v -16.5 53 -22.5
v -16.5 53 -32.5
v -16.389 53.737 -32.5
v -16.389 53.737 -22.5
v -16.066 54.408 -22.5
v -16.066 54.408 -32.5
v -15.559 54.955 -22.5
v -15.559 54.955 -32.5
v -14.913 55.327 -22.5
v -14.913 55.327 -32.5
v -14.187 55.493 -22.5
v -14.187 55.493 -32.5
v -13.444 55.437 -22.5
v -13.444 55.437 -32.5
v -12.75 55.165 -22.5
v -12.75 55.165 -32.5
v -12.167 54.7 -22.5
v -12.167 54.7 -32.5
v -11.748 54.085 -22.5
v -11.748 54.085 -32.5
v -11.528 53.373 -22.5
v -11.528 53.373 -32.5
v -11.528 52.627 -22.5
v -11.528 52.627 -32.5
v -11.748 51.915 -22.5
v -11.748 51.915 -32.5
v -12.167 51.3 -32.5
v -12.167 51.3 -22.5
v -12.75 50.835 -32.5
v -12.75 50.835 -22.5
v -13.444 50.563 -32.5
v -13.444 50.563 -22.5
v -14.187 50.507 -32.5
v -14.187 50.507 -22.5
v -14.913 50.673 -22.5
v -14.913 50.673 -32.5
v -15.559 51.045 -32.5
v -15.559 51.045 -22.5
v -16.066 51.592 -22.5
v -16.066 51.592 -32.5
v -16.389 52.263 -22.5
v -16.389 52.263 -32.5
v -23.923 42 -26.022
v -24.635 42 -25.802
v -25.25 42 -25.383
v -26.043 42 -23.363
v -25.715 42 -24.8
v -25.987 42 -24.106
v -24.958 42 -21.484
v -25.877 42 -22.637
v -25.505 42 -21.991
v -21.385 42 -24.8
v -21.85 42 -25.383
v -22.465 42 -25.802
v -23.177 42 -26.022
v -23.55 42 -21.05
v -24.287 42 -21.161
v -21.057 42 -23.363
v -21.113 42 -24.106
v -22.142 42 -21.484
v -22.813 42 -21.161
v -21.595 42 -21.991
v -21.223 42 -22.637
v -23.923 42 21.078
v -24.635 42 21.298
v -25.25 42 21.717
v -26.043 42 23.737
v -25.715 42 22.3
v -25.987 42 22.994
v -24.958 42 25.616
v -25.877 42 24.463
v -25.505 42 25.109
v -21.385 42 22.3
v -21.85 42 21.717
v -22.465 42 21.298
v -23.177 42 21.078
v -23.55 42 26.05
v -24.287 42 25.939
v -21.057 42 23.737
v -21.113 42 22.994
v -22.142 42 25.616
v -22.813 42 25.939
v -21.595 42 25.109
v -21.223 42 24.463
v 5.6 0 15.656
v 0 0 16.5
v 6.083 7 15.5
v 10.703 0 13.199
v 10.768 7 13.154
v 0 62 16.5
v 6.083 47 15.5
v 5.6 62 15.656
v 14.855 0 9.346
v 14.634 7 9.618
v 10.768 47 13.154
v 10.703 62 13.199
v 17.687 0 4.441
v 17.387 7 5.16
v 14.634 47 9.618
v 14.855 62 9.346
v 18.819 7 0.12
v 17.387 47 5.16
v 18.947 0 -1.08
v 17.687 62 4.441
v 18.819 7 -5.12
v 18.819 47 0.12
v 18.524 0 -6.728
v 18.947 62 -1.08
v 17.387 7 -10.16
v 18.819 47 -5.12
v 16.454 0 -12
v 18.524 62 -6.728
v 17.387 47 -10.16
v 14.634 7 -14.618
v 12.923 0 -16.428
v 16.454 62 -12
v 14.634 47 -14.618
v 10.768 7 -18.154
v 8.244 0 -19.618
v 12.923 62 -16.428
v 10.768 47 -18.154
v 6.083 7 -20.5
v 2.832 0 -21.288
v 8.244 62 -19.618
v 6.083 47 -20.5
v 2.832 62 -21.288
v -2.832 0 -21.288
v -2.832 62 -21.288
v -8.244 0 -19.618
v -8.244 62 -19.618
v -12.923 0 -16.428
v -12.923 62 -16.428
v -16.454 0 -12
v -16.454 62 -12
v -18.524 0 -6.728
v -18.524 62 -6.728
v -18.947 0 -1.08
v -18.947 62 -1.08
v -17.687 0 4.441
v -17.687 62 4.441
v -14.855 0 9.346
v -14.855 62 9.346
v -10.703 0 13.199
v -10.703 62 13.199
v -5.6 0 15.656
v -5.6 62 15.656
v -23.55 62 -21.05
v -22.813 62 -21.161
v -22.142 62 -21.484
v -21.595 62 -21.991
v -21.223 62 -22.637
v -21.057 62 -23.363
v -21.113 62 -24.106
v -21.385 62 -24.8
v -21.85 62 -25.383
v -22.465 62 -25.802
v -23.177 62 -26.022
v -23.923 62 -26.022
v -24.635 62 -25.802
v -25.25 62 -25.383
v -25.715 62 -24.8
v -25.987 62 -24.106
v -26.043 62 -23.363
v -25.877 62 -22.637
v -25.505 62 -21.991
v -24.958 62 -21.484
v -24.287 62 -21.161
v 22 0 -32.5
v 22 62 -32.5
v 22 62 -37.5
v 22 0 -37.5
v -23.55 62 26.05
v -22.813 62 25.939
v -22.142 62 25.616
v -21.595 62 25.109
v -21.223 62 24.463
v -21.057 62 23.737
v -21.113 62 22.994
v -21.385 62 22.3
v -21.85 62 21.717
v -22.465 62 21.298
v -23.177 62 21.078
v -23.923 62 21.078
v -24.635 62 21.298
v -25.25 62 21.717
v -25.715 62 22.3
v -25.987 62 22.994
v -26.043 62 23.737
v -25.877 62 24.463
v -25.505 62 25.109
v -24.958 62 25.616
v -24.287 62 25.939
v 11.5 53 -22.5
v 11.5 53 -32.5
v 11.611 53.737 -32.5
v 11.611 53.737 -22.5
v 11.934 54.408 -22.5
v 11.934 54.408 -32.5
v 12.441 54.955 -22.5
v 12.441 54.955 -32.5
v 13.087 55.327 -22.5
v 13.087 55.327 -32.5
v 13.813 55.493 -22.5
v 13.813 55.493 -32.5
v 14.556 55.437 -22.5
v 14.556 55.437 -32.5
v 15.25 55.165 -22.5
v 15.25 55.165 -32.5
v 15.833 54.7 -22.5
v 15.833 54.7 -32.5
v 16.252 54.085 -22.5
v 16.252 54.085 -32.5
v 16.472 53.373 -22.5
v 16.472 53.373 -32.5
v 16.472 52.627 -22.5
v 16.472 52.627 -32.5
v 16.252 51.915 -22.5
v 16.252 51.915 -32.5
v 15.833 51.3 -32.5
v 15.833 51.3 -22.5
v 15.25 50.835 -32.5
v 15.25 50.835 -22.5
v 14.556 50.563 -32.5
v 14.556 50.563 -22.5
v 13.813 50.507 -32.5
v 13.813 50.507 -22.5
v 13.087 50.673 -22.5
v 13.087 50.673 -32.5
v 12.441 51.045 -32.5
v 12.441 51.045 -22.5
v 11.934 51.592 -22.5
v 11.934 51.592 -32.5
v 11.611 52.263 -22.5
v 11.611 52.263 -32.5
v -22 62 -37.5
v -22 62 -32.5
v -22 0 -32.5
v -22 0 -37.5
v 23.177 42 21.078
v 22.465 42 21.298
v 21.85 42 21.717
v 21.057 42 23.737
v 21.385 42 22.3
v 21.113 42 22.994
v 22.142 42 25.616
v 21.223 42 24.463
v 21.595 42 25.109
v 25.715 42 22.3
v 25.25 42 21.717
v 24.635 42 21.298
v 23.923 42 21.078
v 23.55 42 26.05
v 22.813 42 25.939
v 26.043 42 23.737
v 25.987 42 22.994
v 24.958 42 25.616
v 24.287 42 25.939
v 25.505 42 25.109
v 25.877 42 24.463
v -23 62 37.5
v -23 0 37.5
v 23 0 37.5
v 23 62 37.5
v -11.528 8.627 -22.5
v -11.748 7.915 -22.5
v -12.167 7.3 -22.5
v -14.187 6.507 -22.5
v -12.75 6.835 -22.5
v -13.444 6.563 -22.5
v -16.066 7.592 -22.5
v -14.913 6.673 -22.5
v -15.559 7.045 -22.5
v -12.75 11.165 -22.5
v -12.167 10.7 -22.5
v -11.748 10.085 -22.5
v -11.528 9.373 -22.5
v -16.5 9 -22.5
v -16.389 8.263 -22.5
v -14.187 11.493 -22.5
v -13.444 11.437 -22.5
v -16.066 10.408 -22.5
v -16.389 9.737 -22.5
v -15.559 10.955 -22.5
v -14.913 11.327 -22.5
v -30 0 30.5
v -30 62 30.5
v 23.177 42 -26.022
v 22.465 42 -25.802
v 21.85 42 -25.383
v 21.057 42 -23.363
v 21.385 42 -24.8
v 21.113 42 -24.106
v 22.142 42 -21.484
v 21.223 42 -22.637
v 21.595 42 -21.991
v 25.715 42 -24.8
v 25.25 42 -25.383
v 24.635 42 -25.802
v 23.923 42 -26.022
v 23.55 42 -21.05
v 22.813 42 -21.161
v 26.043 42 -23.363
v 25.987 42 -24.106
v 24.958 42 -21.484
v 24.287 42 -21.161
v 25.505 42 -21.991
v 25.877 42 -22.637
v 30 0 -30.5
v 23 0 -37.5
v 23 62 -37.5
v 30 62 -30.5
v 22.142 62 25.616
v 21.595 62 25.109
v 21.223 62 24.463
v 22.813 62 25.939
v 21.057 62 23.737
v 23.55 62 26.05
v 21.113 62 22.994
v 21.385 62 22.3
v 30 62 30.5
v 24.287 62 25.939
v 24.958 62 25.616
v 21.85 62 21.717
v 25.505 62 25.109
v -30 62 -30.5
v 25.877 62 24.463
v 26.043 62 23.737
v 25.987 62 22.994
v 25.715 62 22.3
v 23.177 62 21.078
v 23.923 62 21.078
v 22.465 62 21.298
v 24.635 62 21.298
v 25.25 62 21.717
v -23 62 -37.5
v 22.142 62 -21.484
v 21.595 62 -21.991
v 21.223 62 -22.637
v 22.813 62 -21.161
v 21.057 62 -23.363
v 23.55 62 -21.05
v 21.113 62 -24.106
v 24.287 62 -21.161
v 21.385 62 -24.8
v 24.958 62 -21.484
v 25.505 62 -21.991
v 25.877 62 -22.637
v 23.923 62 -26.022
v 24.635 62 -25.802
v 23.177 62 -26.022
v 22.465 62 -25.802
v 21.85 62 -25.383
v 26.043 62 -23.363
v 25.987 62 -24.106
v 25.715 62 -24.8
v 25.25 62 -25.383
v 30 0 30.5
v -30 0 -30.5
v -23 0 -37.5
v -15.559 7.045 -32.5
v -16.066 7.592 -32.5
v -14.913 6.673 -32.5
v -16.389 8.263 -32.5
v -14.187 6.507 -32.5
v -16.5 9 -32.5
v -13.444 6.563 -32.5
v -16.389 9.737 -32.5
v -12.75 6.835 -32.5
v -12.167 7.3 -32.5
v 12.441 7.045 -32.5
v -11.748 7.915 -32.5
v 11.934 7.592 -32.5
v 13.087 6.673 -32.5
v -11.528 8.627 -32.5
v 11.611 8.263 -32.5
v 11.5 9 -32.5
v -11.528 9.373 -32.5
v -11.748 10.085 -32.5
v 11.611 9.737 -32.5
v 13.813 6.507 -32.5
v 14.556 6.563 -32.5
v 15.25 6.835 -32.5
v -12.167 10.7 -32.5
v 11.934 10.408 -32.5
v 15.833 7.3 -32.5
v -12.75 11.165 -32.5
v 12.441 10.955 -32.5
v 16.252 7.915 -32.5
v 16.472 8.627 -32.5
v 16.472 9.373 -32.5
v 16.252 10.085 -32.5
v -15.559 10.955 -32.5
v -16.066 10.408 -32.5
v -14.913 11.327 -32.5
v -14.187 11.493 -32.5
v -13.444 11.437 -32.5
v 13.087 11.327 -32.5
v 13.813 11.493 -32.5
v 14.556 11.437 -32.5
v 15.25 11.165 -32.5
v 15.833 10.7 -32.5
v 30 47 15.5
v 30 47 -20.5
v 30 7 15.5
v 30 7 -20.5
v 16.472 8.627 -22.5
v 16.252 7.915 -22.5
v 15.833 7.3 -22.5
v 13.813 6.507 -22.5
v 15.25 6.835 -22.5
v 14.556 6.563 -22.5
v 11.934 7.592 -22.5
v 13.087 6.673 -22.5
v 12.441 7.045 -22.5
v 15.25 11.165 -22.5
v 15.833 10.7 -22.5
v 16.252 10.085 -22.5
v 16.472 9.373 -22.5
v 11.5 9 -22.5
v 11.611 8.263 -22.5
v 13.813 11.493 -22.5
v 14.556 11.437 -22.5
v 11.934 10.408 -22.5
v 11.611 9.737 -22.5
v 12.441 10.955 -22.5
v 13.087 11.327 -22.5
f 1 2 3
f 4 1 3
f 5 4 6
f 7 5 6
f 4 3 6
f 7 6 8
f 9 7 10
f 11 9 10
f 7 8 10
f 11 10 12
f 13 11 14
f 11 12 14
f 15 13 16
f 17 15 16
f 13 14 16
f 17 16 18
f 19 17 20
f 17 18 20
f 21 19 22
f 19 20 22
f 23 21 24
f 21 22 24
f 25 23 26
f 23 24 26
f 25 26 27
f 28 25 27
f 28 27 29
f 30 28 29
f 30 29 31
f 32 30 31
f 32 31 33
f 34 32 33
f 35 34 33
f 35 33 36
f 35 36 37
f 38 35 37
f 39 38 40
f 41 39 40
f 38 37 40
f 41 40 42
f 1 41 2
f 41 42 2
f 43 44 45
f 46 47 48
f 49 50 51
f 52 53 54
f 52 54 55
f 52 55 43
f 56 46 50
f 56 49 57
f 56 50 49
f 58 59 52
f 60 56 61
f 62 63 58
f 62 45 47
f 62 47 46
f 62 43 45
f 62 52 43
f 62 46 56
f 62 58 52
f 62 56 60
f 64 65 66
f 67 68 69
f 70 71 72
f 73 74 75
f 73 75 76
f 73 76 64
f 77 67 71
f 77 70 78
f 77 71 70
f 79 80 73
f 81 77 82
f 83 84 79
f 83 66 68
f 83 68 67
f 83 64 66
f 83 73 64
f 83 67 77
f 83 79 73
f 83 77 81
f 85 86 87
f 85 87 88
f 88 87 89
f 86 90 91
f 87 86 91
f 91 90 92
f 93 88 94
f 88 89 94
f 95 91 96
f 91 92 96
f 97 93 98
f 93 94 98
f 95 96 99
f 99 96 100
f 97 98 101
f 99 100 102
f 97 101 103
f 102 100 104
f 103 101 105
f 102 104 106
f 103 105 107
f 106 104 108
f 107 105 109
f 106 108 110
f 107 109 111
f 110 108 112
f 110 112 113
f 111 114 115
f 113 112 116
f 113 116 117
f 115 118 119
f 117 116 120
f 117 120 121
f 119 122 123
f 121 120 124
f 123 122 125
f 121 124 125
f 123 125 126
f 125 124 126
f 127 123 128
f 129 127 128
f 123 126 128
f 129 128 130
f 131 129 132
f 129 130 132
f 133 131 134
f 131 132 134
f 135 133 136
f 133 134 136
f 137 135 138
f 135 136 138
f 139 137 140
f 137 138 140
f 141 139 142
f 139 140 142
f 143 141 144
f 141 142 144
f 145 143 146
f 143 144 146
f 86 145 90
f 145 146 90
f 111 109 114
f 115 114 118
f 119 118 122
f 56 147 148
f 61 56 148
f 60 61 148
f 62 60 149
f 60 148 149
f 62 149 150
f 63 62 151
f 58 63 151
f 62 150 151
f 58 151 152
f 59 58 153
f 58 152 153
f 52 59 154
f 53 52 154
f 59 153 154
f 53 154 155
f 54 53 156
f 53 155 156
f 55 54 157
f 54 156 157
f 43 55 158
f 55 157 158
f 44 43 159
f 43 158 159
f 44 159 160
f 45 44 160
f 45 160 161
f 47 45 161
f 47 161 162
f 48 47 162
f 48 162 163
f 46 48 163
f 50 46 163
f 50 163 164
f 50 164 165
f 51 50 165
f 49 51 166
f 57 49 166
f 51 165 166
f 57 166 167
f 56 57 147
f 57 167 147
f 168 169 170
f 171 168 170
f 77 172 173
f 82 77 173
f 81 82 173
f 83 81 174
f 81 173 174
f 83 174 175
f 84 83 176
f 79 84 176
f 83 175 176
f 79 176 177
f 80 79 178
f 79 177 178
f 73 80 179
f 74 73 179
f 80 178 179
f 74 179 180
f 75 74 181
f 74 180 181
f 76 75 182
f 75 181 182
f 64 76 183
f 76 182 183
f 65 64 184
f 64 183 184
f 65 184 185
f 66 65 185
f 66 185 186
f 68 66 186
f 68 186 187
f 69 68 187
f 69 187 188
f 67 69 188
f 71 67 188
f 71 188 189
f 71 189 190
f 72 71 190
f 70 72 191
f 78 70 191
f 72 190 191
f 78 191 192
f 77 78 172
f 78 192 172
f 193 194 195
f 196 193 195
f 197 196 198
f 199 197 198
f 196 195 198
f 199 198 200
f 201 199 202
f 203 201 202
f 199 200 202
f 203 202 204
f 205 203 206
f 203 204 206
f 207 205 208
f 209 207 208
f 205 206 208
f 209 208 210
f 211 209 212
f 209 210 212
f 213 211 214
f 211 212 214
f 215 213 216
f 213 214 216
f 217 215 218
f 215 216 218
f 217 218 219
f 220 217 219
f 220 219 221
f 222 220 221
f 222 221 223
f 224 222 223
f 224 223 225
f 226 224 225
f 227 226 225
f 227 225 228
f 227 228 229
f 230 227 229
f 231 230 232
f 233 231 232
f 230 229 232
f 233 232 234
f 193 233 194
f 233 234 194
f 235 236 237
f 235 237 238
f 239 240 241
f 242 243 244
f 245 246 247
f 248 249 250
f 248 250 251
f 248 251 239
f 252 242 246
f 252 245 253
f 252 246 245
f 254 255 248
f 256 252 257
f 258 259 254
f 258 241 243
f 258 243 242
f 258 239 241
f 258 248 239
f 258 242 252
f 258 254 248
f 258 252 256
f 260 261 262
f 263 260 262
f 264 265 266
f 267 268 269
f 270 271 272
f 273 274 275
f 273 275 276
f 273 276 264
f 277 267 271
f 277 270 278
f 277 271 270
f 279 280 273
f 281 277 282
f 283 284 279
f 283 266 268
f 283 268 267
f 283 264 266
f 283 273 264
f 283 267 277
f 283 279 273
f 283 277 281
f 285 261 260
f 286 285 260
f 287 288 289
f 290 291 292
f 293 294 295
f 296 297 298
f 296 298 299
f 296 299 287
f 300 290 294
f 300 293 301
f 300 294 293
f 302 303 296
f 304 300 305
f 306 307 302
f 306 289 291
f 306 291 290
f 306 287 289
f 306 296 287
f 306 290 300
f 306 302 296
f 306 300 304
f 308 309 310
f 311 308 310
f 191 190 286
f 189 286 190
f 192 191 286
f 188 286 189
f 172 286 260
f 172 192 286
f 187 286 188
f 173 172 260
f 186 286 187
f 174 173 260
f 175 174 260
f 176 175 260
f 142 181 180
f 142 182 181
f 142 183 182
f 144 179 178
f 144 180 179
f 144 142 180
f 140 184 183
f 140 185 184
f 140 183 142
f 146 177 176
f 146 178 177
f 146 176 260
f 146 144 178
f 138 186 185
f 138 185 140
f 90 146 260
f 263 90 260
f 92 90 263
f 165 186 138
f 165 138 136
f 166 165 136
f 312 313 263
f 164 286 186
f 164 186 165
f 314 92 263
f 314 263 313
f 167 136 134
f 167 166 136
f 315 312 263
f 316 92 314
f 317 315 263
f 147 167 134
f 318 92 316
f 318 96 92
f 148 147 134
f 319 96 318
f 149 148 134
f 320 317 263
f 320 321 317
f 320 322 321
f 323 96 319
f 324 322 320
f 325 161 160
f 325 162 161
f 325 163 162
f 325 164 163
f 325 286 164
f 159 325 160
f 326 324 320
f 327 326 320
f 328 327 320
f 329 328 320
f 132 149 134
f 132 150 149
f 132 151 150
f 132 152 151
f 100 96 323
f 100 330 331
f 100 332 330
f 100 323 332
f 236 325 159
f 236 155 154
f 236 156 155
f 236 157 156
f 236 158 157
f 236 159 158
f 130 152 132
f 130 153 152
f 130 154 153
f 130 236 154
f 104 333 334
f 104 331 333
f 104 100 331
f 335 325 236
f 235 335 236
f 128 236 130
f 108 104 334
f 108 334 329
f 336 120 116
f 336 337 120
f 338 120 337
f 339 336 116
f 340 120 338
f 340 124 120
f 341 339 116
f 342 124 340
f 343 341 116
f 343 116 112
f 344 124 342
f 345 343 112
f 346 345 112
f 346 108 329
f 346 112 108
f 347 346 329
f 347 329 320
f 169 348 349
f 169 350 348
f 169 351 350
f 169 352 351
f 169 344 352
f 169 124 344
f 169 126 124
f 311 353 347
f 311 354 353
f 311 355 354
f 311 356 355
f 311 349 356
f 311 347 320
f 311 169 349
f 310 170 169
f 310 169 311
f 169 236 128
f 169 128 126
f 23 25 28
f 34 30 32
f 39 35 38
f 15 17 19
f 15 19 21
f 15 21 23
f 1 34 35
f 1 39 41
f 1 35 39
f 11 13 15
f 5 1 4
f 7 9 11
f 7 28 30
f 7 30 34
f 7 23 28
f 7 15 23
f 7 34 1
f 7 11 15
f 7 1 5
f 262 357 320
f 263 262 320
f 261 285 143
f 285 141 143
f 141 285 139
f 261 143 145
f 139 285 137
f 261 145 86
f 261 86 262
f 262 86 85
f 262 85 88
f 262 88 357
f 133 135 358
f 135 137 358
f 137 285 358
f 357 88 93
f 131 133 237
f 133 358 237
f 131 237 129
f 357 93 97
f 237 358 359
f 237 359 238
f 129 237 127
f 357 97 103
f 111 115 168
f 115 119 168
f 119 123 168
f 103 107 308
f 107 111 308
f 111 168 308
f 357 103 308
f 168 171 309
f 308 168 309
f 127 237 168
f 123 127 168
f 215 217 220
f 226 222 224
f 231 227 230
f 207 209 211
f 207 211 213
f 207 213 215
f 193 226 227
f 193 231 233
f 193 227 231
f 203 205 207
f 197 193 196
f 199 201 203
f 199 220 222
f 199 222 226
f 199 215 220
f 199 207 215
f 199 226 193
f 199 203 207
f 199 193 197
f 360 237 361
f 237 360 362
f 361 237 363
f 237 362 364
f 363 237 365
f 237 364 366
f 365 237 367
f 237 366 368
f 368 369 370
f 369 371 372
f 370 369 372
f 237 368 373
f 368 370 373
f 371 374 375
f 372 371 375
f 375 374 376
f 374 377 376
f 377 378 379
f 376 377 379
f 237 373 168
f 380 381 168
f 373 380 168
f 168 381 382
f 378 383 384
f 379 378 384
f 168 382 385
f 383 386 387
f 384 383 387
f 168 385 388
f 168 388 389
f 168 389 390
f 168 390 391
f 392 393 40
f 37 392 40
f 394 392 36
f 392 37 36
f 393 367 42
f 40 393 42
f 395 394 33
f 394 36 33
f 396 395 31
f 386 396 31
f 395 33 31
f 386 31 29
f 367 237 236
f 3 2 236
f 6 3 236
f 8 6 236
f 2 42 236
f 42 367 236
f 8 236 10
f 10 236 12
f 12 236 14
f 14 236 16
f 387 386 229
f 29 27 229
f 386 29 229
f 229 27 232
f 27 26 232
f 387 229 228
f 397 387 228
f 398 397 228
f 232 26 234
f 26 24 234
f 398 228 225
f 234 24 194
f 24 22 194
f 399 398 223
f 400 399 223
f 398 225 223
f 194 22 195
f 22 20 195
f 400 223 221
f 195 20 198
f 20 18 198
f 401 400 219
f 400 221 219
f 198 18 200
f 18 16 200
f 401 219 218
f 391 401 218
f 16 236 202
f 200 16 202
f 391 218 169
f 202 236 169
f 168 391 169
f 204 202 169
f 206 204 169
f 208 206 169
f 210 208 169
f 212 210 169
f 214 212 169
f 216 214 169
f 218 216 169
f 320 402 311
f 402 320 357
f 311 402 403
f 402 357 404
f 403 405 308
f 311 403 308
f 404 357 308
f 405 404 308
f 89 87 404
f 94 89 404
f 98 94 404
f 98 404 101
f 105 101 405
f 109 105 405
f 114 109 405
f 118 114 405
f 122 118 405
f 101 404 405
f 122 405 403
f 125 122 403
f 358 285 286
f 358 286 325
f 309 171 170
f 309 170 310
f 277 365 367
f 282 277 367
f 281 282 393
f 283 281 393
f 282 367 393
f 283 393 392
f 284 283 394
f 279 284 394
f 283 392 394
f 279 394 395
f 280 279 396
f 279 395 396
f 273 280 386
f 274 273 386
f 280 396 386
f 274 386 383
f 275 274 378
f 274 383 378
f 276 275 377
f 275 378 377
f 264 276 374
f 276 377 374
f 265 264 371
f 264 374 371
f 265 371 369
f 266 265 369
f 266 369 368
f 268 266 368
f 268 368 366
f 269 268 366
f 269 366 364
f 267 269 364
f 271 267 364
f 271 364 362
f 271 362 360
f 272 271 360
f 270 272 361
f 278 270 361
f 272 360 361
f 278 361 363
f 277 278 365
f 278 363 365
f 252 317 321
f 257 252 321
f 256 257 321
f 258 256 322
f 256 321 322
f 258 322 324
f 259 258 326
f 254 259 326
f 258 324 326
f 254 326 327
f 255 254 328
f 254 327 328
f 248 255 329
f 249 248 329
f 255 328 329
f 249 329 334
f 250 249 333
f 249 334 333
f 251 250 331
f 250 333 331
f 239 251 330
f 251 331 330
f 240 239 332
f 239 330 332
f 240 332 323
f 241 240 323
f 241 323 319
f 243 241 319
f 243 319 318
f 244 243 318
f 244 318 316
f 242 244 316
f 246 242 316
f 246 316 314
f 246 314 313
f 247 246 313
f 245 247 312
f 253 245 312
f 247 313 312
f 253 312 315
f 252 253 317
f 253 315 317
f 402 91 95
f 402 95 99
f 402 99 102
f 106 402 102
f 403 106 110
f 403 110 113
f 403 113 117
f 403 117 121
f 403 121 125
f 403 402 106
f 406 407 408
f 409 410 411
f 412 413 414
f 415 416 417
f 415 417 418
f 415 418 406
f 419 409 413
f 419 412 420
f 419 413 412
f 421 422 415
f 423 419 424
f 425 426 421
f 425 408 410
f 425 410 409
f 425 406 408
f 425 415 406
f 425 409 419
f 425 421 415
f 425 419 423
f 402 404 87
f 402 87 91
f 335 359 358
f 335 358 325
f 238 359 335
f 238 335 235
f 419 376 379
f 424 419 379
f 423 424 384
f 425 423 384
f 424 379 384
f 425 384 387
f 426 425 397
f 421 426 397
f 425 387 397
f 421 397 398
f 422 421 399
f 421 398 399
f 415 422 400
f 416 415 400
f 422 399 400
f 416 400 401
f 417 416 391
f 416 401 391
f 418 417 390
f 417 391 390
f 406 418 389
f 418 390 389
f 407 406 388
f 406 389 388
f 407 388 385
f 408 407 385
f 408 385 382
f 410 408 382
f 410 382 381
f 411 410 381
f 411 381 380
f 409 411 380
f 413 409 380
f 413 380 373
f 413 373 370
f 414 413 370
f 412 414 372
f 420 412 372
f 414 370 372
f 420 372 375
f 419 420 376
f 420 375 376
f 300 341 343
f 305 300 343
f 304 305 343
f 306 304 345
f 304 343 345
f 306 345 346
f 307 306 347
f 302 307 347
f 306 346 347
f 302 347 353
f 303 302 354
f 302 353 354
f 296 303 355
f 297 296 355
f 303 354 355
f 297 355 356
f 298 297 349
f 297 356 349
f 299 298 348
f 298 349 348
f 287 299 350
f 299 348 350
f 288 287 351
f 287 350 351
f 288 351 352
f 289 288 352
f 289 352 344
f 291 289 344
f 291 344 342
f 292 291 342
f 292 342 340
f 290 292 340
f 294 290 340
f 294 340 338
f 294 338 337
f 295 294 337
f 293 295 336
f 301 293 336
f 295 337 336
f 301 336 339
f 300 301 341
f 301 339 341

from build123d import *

# Parameters (mm, degrees)
SKETCH1_W               = 60
SKETCH1_H               = 75
BOSS_EXTRUDE1_DEPTH     = 62
SKETCH2_R               = 19
SKETCH2_W               = 44
SKETCH2_H               = 5
CUT_EXTRUDE1_DEPTH      = 62
CUT_EXTRUDE2_REACH      = 96.076
CUT_EXTRUDE2_END_RADIUS = 19
SKETCH3_W               = 36
SKETCH3_H               = 40
CHAMFER1_SIZE           = 7
SKETCH4_R               = 2.5
CUT_EXTRUDE3_DEPTH      = 10
SKETCH5_R               = 2.5
CUT_EXTRUDE4_DEPTH      = 20


with BuildPart() as part:
    # Sketch1 → Boss-Extrude1 (new body)
    with BuildSketch(Plane(origin=(0, 0, 0), x_dir=(1, 0, 0), z_dir=(0, 1, 0))):
        Rectangle(SKETCH1_W, SKETCH1_H)
    extrude(amount=BOSS_EXTRUDE1_DEPTH)

    # Sketch2 → Cut-Extrude1 (cut)
    with BuildSketch(Plane(origin=(0, 62, 0), x_dir=(1, 0, 0), z_dir=(0, 1, 0))):
        with Locations(Location((0, 2.5, 0), (0, 0, 270))):
            Circle(SKETCH2_R)
        with Locations((0, 35)):
            Rectangle(SKETCH2_W, SKETCH2_H)
    extrude(amount=-CUT_EXTRUDE1_DEPTH, mode=Mode.SUBTRACT)

    # Cut-Extrude2: up to this cylinder (the profile starts outside it)
    cut_extrude2_end = Plane(origin=(0, 27, -2.5), z_dir=(0, 1, 0)) * Cylinder(CUT_EXTRUDE2_END_RADIUS, 231.152, mode=Mode.PRIVATE)
    # Sketch3 → Cut-Extrude2 (cut, up to the surface)
    with BuildSketch(Plane(origin=(30, 0, 0), x_dir=(0, 0, -1), z_dir=(1, 0, 0)), mode=Mode.PRIVATE) as cut_extrude2_sk1:
        with Locations((2.5, 27)):
            Rectangle(SKETCH3_W, SKETCH3_H)
    cut_extrude2_tool1 = extrude(cut_extrude2_sk1.sketch, amount=-CUT_EXTRUDE2_REACH, mode=Mode.PRIVATE) - cut_extrude2_end
    add(cut_extrude2_tool1.solids().sort_by_distance((30, 27, -2.5))[0], mode=Mode.SUBTRACT)

    # Chamfer1
    chamfer1_edges = [part.edges().sort_by_distance(p)[0] for p in [
        (30, 31, 37.5),
        (-30, 31, 37.5),
        (-30, 31, -37.5),
        (30, 31, -37.5),
    ]]
    chamfer(chamfer1_edges, length=CHAMFER1_SIZE)

    # Sketch4 → Cut-Extrude3 (cut)
    with BuildSketch(Plane(origin=(0, 0, -32.5), x_dir=(-1, 0, 0), z_dir=(0, 0, -1))):
        with Locations((-14, 53)):
            Circle(SKETCH4_R)
        with Locations((14, 53)):
            Circle(SKETCH4_R)
        with Locations((-14, 9)):
            Circle(SKETCH4_R)
        with Locations((14, 9)):
            Circle(SKETCH4_R)
    extrude(amount=-CUT_EXTRUDE3_DEPTH, mode=Mode.SUBTRACT)

    # Sketch5 → Cut-Extrude4 (cut)
    with BuildSketch(Plane(origin=(0, 62, 0), x_dir=(1, 0, 0), z_dir=(0, 1, 0))):
        with Locations(Location((-23.55, 23.55, 0), (0, 0, 270))):
            Circle(SKETCH5_R)
        with Locations(Location((23.55, 23.55, 0), (0, 0, 270))):
            Circle(SKETCH5_R)
        with Locations(Location((23.55, -23.55, 0), (0, 0, 270))):
            Circle(SKETCH5_R)
        with Locations(Location((-23.55, -23.55, 0), (0, 0, 270))):
            Circle(SKETCH5_R)
    extrude(amount=-CUT_EXTRUDE4_DEPTH, mode=Mode.SUBTRACT)


solid = part.part
